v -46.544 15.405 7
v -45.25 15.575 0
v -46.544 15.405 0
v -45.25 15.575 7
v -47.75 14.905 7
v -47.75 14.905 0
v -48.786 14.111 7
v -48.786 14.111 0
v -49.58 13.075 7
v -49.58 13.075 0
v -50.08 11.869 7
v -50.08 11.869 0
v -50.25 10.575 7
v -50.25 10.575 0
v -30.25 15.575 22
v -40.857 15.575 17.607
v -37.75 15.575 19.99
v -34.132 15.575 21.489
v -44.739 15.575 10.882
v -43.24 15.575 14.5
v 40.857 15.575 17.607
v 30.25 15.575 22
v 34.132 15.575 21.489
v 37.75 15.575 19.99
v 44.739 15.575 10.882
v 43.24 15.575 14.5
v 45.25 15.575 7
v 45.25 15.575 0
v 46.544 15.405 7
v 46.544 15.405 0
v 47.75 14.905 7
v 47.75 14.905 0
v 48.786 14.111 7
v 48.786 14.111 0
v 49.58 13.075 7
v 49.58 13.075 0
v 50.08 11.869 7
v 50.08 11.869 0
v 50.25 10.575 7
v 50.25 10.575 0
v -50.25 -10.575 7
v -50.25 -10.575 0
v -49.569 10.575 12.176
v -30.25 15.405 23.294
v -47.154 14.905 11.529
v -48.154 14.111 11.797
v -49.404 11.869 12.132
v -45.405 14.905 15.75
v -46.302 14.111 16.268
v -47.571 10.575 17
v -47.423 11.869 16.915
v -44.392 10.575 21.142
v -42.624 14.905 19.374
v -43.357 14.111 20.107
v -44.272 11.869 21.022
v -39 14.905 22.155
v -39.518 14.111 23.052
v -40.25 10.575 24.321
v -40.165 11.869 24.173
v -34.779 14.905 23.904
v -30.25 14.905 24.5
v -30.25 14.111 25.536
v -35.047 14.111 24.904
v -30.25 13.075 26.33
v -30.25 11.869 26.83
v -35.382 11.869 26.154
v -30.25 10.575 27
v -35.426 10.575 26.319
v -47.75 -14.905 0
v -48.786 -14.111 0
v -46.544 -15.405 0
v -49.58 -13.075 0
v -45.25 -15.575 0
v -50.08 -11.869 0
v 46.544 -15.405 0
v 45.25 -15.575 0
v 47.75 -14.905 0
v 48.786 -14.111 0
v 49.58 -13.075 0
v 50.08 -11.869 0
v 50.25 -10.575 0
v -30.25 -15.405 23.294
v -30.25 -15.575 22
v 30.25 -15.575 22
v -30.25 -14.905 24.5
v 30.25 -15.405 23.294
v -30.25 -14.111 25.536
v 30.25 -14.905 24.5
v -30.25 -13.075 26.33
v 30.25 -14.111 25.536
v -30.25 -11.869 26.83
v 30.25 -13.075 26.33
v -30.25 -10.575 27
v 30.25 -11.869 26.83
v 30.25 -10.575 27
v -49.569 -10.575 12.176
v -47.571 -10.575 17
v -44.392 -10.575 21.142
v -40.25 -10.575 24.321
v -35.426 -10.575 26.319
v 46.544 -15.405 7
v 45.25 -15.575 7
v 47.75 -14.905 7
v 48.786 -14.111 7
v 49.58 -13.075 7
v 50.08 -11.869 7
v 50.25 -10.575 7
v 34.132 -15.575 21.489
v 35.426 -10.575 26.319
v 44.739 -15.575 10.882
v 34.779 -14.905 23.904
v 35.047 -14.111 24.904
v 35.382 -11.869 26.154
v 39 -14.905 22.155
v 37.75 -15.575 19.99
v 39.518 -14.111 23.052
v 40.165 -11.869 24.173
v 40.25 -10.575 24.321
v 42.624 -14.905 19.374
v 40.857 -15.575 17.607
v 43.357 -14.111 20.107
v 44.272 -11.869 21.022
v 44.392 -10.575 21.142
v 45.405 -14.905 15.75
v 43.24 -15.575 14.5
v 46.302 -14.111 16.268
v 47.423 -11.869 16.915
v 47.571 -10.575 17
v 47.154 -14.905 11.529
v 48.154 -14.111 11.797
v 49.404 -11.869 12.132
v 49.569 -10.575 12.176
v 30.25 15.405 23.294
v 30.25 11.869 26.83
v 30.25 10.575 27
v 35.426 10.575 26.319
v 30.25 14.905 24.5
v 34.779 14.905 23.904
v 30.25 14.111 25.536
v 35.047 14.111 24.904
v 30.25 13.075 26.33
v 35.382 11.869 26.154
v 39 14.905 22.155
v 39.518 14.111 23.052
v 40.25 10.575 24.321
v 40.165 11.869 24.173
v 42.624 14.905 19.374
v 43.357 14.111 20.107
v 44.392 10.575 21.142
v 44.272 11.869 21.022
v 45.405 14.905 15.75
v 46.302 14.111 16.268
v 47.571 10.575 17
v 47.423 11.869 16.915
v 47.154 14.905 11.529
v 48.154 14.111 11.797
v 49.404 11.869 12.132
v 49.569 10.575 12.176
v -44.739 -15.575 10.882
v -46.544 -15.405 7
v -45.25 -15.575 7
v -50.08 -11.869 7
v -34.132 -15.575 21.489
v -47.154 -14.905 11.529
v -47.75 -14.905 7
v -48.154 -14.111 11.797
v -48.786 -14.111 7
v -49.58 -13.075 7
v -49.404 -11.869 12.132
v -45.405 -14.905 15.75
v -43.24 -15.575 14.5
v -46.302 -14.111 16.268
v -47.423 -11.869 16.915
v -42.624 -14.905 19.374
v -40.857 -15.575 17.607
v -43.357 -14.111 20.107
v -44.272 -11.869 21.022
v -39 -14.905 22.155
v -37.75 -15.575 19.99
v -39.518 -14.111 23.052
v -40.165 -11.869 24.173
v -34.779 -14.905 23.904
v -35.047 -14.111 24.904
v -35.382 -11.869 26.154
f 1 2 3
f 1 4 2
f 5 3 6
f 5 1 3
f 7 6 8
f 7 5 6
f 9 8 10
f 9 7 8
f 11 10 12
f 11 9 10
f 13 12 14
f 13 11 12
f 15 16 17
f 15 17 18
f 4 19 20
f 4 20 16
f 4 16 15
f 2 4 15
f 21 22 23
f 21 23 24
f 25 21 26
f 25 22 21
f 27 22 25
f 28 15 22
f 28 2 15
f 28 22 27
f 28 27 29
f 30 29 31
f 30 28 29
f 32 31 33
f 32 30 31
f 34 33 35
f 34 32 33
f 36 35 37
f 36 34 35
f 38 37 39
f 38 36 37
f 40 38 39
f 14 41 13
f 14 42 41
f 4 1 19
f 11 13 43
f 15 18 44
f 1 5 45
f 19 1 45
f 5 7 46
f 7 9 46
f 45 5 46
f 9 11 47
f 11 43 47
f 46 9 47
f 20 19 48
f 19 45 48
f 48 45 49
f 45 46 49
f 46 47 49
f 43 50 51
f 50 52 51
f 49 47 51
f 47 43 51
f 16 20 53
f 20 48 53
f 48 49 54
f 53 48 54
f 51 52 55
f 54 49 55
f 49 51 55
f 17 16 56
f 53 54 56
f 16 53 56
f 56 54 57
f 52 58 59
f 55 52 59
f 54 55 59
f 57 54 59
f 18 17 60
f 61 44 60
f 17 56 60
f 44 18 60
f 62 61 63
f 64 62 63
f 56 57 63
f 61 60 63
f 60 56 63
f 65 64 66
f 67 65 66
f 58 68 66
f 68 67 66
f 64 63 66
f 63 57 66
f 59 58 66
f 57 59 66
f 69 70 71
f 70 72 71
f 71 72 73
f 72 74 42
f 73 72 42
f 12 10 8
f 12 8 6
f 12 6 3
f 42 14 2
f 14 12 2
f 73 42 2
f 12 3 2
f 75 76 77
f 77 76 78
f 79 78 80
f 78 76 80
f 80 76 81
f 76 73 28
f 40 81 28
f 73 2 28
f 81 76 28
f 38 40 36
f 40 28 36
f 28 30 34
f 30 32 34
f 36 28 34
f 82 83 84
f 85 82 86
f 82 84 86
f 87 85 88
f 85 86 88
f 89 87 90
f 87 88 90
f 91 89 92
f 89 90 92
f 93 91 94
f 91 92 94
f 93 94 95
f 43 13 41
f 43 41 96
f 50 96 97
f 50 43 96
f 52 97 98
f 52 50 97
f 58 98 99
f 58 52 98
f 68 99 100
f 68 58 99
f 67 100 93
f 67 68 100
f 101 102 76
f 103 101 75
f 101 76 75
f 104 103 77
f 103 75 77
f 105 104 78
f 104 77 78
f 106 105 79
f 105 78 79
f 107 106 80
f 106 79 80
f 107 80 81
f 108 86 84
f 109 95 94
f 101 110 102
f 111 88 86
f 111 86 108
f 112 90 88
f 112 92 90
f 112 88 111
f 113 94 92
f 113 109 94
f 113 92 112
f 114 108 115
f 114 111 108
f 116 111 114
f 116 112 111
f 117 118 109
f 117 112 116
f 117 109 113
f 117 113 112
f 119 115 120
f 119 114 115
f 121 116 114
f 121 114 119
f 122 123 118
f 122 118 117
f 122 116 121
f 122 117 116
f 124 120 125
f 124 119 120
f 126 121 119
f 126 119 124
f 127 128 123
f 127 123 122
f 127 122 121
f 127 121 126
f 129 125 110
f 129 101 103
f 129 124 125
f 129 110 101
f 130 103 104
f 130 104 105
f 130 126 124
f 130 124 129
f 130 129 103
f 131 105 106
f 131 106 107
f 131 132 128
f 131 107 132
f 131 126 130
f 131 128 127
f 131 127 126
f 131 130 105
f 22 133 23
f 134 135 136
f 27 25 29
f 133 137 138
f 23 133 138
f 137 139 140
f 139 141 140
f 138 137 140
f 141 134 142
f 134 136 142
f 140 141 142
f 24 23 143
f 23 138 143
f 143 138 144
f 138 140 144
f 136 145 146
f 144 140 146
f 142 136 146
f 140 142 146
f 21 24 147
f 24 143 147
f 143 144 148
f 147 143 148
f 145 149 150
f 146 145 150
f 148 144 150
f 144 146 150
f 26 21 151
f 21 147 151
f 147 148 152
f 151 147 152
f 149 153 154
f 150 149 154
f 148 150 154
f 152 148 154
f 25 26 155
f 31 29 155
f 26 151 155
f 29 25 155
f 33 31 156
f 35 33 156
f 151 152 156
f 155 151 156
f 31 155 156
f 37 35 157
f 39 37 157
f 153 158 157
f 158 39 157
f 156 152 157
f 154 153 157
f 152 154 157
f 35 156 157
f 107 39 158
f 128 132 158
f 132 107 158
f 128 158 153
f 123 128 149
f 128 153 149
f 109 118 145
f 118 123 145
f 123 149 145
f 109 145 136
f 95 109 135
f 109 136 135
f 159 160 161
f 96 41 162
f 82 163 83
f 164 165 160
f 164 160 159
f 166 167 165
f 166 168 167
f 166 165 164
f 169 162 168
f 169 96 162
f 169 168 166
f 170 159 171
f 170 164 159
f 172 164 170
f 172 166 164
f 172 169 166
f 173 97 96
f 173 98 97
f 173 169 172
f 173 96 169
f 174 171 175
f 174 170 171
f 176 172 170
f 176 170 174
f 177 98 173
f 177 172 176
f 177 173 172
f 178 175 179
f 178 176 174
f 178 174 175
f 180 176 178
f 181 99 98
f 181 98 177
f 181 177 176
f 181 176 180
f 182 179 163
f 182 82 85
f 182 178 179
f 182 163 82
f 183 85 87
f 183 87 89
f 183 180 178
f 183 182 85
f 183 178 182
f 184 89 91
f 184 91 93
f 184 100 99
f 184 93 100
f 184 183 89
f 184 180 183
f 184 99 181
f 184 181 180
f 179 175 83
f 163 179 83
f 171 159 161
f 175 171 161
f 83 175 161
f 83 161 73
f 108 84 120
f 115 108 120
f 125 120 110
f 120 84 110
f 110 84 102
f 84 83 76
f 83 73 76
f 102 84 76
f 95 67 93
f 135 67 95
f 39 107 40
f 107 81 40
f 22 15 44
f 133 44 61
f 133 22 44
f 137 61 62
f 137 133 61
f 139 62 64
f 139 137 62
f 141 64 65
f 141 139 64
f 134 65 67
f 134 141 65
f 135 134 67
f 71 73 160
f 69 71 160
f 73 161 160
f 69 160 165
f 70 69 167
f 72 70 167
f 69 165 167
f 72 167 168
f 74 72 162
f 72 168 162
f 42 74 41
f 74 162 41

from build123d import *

# Parameters (mm, degrees)
SKETCH1_W           = 100.5
SKETCH1_H           = 31.15
BOSS_EXTRUDE1_DEPTH = 27
FILLET1_R           = 20
FILLET2_R           = 5


with BuildPart() as part:
    # Sketch1 → Boss-Extrude1 (new body)
    with BuildSketch(Plane.XY):
        Rectangle(SKETCH1_W, SKETCH1_H)
    extrude(amount=BOSS_EXTRUDE1_DEPTH)

    # Fillet1
    fillet1_edges = [part.edges().sort_by_distance(p)[0] for p in [
        (-50.25, 0, 27),
        (50.25, 0, 27),
    ]]
    fillet(fillet1_edges, radius=FILLET1_R)

    # Fillet2
    fillet2_edges = [part.edges().sort_by_distance(p)[0] for p in [
        (0, 15.575, 27),
        (0, -15.575, 27),
        (-50.25, 15.575, 3.5),
        (50.25, 15.575, 3.5),
        (-44.392135624, 15.575, 21.142135624),
        (44.392135624, 15.575, 21.142135624),
        (50.25, -15.575, 3.5),
        (-50.25, -15.575, 3.5),
        (-44.392135624, -15.575, 21.142135624),
        (44.392135624, -15.575, 21.142135624),
    ]]
    fillet(fillet2_edges, radius=FILLET2_R)


solid = part.part
